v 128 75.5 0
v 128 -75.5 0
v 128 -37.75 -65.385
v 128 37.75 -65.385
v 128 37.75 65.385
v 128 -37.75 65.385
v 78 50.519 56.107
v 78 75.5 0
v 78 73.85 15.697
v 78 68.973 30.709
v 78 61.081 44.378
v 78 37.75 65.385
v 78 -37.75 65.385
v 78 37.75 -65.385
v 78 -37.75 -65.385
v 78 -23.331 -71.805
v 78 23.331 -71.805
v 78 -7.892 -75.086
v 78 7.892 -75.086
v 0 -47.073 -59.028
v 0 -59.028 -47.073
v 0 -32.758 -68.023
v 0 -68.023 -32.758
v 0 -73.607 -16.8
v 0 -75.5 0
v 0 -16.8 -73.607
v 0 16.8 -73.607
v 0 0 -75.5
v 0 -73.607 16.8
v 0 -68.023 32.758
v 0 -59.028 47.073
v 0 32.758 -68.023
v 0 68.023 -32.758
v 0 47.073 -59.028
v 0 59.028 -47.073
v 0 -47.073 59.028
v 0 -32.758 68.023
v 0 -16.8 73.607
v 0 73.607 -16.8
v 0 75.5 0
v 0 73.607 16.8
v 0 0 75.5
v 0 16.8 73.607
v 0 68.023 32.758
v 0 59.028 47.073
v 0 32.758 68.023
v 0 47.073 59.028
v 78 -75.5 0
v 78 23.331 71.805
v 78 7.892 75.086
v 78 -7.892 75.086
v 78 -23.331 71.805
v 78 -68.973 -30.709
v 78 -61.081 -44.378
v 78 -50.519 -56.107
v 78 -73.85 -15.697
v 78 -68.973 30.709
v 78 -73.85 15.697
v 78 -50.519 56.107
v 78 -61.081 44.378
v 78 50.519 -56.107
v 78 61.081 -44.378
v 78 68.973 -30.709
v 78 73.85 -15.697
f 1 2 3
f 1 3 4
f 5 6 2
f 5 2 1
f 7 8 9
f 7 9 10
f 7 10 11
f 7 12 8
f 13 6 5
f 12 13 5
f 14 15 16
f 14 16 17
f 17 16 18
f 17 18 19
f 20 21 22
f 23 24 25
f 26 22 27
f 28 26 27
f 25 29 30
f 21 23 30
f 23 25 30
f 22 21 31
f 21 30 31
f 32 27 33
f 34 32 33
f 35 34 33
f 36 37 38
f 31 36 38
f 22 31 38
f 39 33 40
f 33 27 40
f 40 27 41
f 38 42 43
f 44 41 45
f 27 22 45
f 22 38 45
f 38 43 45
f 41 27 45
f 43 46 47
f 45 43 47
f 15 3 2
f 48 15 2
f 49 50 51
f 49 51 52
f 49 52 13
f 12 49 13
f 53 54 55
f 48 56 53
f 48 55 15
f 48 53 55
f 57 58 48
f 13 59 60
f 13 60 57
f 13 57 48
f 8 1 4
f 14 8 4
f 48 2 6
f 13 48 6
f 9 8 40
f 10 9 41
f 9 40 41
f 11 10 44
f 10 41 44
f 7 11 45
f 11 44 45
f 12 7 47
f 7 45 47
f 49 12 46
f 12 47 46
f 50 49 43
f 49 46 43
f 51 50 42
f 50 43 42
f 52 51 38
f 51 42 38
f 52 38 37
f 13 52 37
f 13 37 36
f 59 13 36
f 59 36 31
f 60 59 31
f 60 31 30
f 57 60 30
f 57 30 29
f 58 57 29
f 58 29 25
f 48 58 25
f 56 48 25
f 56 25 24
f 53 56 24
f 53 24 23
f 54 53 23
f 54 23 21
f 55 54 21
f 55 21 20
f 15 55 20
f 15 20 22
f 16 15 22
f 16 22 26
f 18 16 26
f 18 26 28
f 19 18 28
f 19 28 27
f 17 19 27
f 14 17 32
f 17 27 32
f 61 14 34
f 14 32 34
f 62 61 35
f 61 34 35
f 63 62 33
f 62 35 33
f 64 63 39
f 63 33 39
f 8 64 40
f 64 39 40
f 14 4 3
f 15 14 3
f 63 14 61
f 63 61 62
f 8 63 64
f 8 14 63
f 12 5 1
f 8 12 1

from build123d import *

# Parameters (mm, degrees)
F0_R     = 75.5
F1_DEPTH = 128
F3_DEPTH = 50


with BuildPart() as f1:
    # F0 (on Right) → F1 (new body)
    with BuildSketch(Plane.YZ):
        Circle(F0_R)
    extrude(amount=F1_DEPTH)

    # F2 (on face) → F3 (cut)
    with BuildSketch(Plane.YZ.offset(128)):
        with BuildLine():
            Line((-75.5, 0), (-37.75, 65.384918))
            ThreePointArc((-37.75, 65.384918), (-65.384918, 37.75), (-75.5, 0))
        make_face()
        with BuildLine():
            ThreePointArc((37.75, 65.384918), (0, 75.5), (-37.75, 65.384918))
            Line((-37.75, 65.384918), (37.75, 65.384918))
        make_face()
        with BuildLine():
            ThreePointArc((75.5, 0), (65.384918, 37.75), (37.75, 65.384918))
            Line((37.75, 65.384918), (75.5, 0))
        make_face()
        with BuildLine():
            ThreePointArc((37.75, -65.384918), (65.384918, -37.75), (75.5, 0))
            Line((75.5, 0), (37.75, -65.384918))
        make_face()
        with BuildLine():
            Line((37.75, -65.384918), (-37.75, -65.384918))
            ThreePointArc((-37.75, -65.384918), (0, -75.5), (37.75, -65.384918))
        make_face()
        with BuildLine():
            Line((-37.75, -65.384918), (-75.5, 0))
            ThreePointArc((-75.5, 0), (-65.384918, -37.75), (-37.75, -65.384918))
        make_face()
    extrude(amount=-F3_DEPTH, mode=Mode.SUBTRACT)


with BuildPart() as f1_1:
    # F4: moved
    add(f1.part)


solid = f1_1.part
